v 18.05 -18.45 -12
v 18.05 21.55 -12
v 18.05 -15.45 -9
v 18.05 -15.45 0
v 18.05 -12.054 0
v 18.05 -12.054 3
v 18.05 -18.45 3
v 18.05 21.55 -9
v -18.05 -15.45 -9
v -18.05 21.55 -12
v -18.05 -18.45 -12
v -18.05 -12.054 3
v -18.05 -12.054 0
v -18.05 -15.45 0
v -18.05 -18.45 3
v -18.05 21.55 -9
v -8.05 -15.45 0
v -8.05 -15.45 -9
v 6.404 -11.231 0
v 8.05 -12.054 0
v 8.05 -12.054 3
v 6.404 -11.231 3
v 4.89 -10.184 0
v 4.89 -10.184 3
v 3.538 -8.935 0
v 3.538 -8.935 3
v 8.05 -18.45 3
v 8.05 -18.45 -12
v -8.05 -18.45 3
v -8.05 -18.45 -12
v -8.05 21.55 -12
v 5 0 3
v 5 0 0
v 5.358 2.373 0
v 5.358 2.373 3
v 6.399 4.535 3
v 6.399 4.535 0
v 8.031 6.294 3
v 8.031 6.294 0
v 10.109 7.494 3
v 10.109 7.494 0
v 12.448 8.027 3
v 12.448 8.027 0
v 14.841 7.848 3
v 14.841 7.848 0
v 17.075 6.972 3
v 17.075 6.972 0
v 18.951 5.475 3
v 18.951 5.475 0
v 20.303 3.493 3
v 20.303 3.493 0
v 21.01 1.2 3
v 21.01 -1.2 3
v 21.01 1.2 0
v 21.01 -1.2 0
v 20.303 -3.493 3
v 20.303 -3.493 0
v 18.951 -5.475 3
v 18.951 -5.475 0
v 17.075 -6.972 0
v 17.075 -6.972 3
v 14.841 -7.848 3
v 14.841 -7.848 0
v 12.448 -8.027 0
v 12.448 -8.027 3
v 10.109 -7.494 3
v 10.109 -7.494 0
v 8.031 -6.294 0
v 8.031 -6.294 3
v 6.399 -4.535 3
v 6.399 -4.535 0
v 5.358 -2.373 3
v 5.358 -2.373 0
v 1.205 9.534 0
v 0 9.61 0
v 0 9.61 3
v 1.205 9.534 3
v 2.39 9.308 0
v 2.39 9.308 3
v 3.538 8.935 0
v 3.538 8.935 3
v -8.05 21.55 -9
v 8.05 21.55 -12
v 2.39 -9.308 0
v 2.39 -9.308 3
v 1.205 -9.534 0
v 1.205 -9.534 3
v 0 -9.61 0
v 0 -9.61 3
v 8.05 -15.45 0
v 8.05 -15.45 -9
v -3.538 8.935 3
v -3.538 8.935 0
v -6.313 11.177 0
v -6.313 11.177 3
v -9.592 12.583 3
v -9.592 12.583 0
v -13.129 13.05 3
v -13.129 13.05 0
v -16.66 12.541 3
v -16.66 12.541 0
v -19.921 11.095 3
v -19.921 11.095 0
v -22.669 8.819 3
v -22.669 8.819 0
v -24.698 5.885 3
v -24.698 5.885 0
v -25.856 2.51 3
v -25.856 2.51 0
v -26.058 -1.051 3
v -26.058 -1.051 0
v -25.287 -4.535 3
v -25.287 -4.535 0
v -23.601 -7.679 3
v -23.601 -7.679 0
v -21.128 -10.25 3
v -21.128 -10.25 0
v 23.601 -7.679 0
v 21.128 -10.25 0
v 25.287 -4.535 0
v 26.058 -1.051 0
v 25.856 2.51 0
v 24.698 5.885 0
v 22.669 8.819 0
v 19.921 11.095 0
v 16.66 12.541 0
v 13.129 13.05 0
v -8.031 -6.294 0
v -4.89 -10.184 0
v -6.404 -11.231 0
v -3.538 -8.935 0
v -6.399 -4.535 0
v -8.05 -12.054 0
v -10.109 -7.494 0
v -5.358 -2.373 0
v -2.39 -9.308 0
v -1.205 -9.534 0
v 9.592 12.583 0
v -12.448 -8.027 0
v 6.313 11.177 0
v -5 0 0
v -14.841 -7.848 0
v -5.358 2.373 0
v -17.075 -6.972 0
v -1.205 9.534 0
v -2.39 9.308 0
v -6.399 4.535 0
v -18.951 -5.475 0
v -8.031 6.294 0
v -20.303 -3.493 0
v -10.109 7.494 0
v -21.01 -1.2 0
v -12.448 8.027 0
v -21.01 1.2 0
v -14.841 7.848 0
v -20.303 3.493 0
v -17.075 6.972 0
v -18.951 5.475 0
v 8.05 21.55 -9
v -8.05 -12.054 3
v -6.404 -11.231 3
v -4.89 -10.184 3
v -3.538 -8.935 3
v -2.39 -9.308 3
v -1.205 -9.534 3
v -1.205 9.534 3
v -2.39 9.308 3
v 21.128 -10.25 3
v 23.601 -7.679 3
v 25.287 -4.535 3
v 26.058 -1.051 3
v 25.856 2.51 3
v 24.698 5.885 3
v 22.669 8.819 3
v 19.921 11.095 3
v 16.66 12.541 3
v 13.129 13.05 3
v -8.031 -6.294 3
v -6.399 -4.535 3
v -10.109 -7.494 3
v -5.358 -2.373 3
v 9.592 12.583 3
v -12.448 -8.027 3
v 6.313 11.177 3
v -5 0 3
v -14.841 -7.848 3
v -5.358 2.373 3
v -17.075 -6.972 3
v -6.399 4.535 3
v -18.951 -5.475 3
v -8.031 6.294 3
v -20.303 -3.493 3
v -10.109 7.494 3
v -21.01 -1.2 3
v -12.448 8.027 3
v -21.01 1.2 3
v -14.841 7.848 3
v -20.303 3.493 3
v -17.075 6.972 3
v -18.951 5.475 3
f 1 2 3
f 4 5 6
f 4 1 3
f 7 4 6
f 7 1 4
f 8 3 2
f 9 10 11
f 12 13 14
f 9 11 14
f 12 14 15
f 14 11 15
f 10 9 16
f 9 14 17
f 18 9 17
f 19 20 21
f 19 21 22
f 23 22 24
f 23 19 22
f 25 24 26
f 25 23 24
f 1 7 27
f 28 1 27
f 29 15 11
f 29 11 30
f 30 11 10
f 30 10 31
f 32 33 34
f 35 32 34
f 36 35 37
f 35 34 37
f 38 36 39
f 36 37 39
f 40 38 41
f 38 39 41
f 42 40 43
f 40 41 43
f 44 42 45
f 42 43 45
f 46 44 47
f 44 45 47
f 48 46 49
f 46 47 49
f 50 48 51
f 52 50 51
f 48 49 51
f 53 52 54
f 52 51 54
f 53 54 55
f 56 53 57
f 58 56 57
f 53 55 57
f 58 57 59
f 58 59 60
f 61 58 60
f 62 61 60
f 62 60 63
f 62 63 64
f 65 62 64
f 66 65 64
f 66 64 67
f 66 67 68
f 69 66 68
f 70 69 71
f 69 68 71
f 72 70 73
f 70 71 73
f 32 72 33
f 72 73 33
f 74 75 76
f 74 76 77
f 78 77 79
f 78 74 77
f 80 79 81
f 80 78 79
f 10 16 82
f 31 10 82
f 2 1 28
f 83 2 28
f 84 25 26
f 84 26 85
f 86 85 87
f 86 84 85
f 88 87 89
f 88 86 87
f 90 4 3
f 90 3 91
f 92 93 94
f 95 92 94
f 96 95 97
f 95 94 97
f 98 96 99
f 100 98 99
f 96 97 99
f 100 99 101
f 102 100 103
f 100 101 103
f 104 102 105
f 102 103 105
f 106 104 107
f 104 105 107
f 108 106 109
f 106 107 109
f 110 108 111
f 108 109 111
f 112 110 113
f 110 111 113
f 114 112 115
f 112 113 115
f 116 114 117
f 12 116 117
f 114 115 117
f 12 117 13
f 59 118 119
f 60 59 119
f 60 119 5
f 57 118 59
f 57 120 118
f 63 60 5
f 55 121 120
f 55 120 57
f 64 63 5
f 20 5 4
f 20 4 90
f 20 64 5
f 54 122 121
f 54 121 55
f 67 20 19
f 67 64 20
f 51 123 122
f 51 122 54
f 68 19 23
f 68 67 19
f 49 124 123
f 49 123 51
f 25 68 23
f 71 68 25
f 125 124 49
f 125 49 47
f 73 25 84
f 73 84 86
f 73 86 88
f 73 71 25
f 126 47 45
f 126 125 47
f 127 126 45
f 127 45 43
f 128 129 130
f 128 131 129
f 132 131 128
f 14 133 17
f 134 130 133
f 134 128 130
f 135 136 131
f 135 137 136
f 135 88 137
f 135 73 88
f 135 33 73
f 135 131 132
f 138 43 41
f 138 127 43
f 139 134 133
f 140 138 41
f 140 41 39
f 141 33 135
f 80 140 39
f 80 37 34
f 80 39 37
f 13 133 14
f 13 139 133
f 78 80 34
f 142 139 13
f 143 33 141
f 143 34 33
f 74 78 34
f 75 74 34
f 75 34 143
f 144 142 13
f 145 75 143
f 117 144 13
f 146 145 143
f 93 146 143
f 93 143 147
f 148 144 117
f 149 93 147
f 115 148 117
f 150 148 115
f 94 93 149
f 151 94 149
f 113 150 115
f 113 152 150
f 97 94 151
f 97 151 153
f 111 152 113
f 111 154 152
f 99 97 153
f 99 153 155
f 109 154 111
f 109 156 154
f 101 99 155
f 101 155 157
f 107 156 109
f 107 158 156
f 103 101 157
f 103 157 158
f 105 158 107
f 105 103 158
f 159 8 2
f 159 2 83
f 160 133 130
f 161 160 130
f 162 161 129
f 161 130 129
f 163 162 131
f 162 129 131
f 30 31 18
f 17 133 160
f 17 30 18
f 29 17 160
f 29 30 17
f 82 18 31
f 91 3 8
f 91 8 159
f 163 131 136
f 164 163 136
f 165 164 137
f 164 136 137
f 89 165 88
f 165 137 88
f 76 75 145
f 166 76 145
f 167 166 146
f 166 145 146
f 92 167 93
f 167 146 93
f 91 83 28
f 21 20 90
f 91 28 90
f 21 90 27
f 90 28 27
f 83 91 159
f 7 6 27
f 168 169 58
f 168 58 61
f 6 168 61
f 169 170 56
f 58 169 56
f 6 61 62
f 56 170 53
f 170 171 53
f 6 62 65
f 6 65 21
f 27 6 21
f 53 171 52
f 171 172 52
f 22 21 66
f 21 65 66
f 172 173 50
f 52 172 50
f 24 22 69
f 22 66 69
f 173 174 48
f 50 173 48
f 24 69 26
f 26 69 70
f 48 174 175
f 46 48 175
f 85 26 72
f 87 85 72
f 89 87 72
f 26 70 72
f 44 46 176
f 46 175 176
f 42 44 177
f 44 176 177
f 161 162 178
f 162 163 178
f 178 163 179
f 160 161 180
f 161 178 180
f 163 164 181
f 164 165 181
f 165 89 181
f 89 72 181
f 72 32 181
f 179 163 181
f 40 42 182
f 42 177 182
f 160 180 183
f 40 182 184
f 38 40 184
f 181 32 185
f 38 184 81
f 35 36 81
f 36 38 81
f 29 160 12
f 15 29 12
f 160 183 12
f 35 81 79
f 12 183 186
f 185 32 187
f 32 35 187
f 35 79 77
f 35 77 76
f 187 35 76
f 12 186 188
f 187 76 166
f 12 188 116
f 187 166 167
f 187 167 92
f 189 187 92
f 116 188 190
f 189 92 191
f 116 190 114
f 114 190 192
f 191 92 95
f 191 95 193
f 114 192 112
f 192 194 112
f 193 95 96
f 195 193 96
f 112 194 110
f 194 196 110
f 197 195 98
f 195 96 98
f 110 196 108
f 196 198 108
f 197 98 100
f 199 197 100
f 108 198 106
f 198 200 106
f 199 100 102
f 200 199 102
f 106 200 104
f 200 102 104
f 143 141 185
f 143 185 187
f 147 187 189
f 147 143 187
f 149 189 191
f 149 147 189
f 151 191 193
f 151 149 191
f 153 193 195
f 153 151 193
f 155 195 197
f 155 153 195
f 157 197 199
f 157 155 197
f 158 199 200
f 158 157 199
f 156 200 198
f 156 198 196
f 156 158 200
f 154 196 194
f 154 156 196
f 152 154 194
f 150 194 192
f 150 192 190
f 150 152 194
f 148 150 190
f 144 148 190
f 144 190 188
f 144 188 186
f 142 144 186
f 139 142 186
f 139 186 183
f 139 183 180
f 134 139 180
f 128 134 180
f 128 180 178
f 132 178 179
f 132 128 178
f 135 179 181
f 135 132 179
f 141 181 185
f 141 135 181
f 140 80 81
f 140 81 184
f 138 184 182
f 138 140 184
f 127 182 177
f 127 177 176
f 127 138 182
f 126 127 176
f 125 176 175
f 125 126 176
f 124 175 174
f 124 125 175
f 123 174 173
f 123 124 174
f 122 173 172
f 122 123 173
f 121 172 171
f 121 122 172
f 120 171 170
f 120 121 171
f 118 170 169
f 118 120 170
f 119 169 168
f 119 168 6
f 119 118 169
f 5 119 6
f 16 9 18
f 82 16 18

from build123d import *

# Parameters (mm, degrees)
F0_R     = 8.05
F1_DEPTH = 3
F2_W     = 10
F2_H     = 3
F3_DEPTH = 3
F4_DEPTH = 9
F5_W     = 10
F5_H     = 3
F6_DEPTH = 40


with BuildPart() as f1:
    # F0 (on Top) → F1 (new body)
    with BuildSketch(Plane.XY):
        with BuildLine():
            ThreePointArc((-3.5381985419, -8.9346590881), (-0.9167500432, -4.8048668541), (0, 0))
            ThreePointArc((0, 0), (-0.9167500432, 4.8048668541), (-3.5381985419, 8.9346590881))
            ThreePointArc((-3.5381985419, 8.9346590881), (-26.1, 0), (-3.5381985419, -8.9346590881))
        make_face()
        with Locations((-13.05, 0)):
            Circle(F0_R, mode=Mode.SUBTRACT)
        with BuildLine():
            Line((0, -9.6097337082), (0, 0))
            ThreePointArc((0, 0), (-0.9167500432, -4.8048668541), (-3.5381985419, -8.9346590881))
            ThreePointArc((-3.5381985419, -8.9346590881), (-1.8010118451, -9.4394564609), (0, -9.6097337082))
        make_face()
        with BuildLine():
            ThreePointArc((-3.5381985419, 8.9346590881), (-0.9167500432, 4.8048668541), (0, 0))
            Line((0, 0), (0, 9.6097337082))
            ThreePointArc((0, 9.6097337082), (-1.8010118451, 9.4394564609), (-3.5381985419, 8.9346590881))
        make_face()
    extrude(amount=F1_DEPTH)

    # F2 (on face) → F3 (join, through all)
    with BuildSketch(Plane(origin=(0, 0, 0), x_dir=(1, 0, 0), z_dir=(0, 0, -1))):
        with BuildLine():
            ThreePointArc((-18.05, 12.0541486634), (-13.05, 13.05), (-8.05, 12.0541486634))
            Line((-8.05, 12.0541486634), (-8.05, 15.45))
            Line((-8.05, 15.45), (-18.05, 15.45))
            Line((-18.05, 15.45), (-18.05, 12.0541486634))
        make_face()
        with Locations((-13.05, 16.95)):
            Rectangle(F2_W, F2_H)
    extrude(amount=-F3_DEPTH)

    # F2 (on face) → F4 (join)
    with BuildSketch(Plane(origin=(0, 0, 0), x_dir=(1, 0, 0), z_dir=(0, 0, -1))):
        with Locations((-13.05, 16.95)):
            Rectangle(F2_W, F2_H)
    extrude(amount=F4_DEPTH)

    # F5 (on face) → F6 (join)
    with BuildSketch(Plane.XZ.offset(18.45)):
        with Locations((-13.05, -10.5)):
            Rectangle(F5_W, F5_H)
    extrude(amount=-F6_DEPTH)

    # F7: F1 across plane


with BuildPart() as f1_1:
    add(f1.part)
    add(f1.part.mirror(Plane.YZ))


solid = f1_1.part
